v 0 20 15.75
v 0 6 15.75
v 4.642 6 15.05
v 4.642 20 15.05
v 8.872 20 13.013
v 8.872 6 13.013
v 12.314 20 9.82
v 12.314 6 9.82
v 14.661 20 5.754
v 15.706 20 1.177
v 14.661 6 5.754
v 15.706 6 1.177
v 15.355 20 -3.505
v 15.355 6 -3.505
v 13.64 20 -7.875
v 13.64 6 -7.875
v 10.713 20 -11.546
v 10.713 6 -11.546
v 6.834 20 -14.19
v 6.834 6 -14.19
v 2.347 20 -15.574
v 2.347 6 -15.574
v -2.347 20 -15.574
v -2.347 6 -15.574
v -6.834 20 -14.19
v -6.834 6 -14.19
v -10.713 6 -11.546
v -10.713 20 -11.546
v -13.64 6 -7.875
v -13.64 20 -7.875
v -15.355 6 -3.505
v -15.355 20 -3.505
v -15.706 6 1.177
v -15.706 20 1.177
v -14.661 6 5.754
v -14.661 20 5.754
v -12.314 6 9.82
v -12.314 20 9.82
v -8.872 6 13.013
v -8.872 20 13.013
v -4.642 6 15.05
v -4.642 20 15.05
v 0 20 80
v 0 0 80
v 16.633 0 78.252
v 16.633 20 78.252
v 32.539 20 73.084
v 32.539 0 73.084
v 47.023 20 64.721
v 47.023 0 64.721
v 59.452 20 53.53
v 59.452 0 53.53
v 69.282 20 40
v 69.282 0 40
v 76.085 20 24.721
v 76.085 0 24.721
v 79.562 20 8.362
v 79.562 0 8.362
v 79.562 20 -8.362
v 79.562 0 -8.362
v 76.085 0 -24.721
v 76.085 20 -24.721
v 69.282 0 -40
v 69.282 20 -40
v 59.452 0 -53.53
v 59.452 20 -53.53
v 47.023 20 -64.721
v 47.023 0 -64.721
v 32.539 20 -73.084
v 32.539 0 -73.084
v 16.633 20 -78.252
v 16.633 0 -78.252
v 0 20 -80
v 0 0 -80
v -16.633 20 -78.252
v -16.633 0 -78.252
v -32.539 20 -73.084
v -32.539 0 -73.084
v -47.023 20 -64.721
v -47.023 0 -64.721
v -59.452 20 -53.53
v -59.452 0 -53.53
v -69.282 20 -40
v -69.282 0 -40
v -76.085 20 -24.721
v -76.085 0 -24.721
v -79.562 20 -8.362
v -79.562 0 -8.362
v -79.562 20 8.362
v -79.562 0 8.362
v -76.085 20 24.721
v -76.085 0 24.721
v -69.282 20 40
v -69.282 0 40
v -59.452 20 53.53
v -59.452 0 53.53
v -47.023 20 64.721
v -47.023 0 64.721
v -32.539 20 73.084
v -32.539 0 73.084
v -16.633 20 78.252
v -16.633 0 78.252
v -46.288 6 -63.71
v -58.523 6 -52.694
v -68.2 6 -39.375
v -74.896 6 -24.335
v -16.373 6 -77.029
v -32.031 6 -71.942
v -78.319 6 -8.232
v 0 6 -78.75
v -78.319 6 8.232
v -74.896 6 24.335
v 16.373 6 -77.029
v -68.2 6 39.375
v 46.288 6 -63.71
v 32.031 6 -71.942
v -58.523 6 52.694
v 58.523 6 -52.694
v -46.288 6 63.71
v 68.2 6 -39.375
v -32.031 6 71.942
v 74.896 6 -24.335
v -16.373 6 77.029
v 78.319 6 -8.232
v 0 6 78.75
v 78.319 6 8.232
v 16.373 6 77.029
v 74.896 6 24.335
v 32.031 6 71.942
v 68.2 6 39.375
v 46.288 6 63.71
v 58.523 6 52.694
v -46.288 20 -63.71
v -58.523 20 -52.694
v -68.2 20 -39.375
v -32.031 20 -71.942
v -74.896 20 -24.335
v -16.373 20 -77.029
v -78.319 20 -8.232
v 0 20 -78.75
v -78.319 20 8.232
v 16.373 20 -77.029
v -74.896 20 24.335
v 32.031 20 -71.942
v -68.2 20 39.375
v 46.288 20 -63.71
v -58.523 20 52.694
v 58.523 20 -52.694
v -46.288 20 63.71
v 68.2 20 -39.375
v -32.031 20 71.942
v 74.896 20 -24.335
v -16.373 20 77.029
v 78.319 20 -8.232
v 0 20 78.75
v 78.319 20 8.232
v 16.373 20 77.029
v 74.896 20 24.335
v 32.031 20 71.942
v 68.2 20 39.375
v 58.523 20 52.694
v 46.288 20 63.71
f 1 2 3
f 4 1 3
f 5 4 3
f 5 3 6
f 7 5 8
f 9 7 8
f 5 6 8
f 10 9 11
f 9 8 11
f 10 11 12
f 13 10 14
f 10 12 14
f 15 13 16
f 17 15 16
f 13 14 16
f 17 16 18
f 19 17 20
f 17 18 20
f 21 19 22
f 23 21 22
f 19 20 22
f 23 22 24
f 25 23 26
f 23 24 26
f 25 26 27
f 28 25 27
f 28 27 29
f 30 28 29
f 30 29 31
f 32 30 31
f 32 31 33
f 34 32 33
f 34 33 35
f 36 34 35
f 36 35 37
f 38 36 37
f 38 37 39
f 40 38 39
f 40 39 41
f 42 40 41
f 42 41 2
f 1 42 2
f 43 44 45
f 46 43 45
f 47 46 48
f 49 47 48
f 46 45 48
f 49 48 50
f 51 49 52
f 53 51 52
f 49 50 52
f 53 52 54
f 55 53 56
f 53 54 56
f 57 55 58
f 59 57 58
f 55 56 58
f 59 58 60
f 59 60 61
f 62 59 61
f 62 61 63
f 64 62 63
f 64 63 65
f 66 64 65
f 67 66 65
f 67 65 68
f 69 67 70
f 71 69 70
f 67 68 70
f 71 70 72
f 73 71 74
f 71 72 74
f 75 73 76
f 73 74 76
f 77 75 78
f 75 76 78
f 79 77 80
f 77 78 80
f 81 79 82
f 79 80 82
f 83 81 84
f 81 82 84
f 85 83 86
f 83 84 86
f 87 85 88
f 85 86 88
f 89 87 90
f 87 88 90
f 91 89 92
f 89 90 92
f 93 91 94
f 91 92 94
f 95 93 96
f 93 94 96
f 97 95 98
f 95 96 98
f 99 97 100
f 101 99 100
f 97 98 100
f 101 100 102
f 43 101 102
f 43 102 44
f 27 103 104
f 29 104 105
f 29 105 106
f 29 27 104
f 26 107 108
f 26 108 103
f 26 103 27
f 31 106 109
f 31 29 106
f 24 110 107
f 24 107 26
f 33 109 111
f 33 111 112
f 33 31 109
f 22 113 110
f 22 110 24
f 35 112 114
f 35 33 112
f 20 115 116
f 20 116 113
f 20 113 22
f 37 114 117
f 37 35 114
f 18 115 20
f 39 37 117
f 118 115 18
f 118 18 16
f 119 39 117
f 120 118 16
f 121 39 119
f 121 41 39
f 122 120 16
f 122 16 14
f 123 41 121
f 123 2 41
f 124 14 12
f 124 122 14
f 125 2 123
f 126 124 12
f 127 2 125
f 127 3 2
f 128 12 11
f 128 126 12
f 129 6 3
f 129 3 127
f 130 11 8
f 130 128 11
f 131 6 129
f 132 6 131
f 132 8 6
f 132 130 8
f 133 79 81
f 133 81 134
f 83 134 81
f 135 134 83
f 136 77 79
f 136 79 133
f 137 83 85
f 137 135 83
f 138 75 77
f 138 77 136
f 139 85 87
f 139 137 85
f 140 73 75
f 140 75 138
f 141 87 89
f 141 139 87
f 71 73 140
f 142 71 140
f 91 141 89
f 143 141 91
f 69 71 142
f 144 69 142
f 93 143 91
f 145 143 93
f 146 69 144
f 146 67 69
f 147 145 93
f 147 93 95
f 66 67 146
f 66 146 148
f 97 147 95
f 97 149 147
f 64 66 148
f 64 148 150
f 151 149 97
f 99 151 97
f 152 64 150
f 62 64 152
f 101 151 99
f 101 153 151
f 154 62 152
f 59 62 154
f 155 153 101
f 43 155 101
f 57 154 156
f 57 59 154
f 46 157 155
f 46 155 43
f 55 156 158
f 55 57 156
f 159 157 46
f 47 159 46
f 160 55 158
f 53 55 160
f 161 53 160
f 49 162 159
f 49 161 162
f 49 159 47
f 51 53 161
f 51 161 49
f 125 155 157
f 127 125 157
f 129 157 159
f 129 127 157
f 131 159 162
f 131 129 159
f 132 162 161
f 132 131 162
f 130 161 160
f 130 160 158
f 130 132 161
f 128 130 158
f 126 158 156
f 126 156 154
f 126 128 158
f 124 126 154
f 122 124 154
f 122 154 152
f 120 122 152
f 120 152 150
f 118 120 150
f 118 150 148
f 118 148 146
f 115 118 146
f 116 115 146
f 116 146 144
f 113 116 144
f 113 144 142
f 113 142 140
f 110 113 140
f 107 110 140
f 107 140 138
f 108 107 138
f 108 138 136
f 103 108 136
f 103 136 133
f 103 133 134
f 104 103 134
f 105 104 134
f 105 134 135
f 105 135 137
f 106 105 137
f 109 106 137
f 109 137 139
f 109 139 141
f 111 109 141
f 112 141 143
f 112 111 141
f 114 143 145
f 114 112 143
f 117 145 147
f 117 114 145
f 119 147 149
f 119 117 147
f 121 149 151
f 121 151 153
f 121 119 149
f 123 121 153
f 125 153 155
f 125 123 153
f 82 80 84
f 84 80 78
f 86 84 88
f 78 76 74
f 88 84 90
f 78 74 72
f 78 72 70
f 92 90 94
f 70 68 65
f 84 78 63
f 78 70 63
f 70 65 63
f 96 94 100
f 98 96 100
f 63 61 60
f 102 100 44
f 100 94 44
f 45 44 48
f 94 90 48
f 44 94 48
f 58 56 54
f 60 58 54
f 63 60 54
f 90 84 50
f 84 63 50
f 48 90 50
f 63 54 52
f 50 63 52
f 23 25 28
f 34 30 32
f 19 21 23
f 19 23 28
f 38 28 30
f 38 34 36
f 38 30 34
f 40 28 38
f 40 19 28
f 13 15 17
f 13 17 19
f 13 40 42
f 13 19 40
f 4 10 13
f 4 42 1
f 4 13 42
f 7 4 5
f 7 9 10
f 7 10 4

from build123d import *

# Parameters (mm, degrees)
SKETCH1_R           = 80
SKETCH1_R_2         = 78.75
BOSS_EXTRUDE1_DEPTH = 20
SKETCH1_3_R         = 15.75
BOSS_EXTRUDE2_DEPTH = 20
SKETCH1_4_R         = 78.75
SKETCH1_4_R_2       = 15.75
BOSS_EXTRUDE3_DEPTH = 6


with BuildPart() as part:
    # Sketch1 → Boss-Extrude1 (new body)
    with BuildSketch(Plane(origin=(0, 0, 0), x_dir=(1, 0, 0), z_dir=(0, 1, 0))):
        Circle(SKETCH1_R)
        Circle(SKETCH1_R_2, mode=Mode.SUBTRACT)
    extrude(amount=BOSS_EXTRUDE1_DEPTH)



with BuildPart() as body_2:
    # Sketch1<3> → Boss-Extrude2 (new body)
    with BuildSketch(Plane(origin=(0, 0, 0), x_dir=(1, 0, 0), z_dir=(0, 1, 0))):
        Circle(SKETCH1_3_R)
    extrude(amount=BOSS_EXTRUDE2_DEPTH)


with BuildPart() as part_1:
    add(part.part)

    add(body_2.part)  # Boss-Extrude3 merges body 2
    # Sketch1<4> → Boss-Extrude3 (add)
    with BuildSketch(Plane(origin=(0, 0, 0), x_dir=(1, 0, 0), z_dir=(0, 1, 0))):
        Circle(SKETCH1_4_R)
        Circle(SKETCH1_4_R_2, mode=Mode.SUBTRACT)
    extrude(amount=BOSS_EXTRUDE3_DEPTH)


solid = part_1.part
